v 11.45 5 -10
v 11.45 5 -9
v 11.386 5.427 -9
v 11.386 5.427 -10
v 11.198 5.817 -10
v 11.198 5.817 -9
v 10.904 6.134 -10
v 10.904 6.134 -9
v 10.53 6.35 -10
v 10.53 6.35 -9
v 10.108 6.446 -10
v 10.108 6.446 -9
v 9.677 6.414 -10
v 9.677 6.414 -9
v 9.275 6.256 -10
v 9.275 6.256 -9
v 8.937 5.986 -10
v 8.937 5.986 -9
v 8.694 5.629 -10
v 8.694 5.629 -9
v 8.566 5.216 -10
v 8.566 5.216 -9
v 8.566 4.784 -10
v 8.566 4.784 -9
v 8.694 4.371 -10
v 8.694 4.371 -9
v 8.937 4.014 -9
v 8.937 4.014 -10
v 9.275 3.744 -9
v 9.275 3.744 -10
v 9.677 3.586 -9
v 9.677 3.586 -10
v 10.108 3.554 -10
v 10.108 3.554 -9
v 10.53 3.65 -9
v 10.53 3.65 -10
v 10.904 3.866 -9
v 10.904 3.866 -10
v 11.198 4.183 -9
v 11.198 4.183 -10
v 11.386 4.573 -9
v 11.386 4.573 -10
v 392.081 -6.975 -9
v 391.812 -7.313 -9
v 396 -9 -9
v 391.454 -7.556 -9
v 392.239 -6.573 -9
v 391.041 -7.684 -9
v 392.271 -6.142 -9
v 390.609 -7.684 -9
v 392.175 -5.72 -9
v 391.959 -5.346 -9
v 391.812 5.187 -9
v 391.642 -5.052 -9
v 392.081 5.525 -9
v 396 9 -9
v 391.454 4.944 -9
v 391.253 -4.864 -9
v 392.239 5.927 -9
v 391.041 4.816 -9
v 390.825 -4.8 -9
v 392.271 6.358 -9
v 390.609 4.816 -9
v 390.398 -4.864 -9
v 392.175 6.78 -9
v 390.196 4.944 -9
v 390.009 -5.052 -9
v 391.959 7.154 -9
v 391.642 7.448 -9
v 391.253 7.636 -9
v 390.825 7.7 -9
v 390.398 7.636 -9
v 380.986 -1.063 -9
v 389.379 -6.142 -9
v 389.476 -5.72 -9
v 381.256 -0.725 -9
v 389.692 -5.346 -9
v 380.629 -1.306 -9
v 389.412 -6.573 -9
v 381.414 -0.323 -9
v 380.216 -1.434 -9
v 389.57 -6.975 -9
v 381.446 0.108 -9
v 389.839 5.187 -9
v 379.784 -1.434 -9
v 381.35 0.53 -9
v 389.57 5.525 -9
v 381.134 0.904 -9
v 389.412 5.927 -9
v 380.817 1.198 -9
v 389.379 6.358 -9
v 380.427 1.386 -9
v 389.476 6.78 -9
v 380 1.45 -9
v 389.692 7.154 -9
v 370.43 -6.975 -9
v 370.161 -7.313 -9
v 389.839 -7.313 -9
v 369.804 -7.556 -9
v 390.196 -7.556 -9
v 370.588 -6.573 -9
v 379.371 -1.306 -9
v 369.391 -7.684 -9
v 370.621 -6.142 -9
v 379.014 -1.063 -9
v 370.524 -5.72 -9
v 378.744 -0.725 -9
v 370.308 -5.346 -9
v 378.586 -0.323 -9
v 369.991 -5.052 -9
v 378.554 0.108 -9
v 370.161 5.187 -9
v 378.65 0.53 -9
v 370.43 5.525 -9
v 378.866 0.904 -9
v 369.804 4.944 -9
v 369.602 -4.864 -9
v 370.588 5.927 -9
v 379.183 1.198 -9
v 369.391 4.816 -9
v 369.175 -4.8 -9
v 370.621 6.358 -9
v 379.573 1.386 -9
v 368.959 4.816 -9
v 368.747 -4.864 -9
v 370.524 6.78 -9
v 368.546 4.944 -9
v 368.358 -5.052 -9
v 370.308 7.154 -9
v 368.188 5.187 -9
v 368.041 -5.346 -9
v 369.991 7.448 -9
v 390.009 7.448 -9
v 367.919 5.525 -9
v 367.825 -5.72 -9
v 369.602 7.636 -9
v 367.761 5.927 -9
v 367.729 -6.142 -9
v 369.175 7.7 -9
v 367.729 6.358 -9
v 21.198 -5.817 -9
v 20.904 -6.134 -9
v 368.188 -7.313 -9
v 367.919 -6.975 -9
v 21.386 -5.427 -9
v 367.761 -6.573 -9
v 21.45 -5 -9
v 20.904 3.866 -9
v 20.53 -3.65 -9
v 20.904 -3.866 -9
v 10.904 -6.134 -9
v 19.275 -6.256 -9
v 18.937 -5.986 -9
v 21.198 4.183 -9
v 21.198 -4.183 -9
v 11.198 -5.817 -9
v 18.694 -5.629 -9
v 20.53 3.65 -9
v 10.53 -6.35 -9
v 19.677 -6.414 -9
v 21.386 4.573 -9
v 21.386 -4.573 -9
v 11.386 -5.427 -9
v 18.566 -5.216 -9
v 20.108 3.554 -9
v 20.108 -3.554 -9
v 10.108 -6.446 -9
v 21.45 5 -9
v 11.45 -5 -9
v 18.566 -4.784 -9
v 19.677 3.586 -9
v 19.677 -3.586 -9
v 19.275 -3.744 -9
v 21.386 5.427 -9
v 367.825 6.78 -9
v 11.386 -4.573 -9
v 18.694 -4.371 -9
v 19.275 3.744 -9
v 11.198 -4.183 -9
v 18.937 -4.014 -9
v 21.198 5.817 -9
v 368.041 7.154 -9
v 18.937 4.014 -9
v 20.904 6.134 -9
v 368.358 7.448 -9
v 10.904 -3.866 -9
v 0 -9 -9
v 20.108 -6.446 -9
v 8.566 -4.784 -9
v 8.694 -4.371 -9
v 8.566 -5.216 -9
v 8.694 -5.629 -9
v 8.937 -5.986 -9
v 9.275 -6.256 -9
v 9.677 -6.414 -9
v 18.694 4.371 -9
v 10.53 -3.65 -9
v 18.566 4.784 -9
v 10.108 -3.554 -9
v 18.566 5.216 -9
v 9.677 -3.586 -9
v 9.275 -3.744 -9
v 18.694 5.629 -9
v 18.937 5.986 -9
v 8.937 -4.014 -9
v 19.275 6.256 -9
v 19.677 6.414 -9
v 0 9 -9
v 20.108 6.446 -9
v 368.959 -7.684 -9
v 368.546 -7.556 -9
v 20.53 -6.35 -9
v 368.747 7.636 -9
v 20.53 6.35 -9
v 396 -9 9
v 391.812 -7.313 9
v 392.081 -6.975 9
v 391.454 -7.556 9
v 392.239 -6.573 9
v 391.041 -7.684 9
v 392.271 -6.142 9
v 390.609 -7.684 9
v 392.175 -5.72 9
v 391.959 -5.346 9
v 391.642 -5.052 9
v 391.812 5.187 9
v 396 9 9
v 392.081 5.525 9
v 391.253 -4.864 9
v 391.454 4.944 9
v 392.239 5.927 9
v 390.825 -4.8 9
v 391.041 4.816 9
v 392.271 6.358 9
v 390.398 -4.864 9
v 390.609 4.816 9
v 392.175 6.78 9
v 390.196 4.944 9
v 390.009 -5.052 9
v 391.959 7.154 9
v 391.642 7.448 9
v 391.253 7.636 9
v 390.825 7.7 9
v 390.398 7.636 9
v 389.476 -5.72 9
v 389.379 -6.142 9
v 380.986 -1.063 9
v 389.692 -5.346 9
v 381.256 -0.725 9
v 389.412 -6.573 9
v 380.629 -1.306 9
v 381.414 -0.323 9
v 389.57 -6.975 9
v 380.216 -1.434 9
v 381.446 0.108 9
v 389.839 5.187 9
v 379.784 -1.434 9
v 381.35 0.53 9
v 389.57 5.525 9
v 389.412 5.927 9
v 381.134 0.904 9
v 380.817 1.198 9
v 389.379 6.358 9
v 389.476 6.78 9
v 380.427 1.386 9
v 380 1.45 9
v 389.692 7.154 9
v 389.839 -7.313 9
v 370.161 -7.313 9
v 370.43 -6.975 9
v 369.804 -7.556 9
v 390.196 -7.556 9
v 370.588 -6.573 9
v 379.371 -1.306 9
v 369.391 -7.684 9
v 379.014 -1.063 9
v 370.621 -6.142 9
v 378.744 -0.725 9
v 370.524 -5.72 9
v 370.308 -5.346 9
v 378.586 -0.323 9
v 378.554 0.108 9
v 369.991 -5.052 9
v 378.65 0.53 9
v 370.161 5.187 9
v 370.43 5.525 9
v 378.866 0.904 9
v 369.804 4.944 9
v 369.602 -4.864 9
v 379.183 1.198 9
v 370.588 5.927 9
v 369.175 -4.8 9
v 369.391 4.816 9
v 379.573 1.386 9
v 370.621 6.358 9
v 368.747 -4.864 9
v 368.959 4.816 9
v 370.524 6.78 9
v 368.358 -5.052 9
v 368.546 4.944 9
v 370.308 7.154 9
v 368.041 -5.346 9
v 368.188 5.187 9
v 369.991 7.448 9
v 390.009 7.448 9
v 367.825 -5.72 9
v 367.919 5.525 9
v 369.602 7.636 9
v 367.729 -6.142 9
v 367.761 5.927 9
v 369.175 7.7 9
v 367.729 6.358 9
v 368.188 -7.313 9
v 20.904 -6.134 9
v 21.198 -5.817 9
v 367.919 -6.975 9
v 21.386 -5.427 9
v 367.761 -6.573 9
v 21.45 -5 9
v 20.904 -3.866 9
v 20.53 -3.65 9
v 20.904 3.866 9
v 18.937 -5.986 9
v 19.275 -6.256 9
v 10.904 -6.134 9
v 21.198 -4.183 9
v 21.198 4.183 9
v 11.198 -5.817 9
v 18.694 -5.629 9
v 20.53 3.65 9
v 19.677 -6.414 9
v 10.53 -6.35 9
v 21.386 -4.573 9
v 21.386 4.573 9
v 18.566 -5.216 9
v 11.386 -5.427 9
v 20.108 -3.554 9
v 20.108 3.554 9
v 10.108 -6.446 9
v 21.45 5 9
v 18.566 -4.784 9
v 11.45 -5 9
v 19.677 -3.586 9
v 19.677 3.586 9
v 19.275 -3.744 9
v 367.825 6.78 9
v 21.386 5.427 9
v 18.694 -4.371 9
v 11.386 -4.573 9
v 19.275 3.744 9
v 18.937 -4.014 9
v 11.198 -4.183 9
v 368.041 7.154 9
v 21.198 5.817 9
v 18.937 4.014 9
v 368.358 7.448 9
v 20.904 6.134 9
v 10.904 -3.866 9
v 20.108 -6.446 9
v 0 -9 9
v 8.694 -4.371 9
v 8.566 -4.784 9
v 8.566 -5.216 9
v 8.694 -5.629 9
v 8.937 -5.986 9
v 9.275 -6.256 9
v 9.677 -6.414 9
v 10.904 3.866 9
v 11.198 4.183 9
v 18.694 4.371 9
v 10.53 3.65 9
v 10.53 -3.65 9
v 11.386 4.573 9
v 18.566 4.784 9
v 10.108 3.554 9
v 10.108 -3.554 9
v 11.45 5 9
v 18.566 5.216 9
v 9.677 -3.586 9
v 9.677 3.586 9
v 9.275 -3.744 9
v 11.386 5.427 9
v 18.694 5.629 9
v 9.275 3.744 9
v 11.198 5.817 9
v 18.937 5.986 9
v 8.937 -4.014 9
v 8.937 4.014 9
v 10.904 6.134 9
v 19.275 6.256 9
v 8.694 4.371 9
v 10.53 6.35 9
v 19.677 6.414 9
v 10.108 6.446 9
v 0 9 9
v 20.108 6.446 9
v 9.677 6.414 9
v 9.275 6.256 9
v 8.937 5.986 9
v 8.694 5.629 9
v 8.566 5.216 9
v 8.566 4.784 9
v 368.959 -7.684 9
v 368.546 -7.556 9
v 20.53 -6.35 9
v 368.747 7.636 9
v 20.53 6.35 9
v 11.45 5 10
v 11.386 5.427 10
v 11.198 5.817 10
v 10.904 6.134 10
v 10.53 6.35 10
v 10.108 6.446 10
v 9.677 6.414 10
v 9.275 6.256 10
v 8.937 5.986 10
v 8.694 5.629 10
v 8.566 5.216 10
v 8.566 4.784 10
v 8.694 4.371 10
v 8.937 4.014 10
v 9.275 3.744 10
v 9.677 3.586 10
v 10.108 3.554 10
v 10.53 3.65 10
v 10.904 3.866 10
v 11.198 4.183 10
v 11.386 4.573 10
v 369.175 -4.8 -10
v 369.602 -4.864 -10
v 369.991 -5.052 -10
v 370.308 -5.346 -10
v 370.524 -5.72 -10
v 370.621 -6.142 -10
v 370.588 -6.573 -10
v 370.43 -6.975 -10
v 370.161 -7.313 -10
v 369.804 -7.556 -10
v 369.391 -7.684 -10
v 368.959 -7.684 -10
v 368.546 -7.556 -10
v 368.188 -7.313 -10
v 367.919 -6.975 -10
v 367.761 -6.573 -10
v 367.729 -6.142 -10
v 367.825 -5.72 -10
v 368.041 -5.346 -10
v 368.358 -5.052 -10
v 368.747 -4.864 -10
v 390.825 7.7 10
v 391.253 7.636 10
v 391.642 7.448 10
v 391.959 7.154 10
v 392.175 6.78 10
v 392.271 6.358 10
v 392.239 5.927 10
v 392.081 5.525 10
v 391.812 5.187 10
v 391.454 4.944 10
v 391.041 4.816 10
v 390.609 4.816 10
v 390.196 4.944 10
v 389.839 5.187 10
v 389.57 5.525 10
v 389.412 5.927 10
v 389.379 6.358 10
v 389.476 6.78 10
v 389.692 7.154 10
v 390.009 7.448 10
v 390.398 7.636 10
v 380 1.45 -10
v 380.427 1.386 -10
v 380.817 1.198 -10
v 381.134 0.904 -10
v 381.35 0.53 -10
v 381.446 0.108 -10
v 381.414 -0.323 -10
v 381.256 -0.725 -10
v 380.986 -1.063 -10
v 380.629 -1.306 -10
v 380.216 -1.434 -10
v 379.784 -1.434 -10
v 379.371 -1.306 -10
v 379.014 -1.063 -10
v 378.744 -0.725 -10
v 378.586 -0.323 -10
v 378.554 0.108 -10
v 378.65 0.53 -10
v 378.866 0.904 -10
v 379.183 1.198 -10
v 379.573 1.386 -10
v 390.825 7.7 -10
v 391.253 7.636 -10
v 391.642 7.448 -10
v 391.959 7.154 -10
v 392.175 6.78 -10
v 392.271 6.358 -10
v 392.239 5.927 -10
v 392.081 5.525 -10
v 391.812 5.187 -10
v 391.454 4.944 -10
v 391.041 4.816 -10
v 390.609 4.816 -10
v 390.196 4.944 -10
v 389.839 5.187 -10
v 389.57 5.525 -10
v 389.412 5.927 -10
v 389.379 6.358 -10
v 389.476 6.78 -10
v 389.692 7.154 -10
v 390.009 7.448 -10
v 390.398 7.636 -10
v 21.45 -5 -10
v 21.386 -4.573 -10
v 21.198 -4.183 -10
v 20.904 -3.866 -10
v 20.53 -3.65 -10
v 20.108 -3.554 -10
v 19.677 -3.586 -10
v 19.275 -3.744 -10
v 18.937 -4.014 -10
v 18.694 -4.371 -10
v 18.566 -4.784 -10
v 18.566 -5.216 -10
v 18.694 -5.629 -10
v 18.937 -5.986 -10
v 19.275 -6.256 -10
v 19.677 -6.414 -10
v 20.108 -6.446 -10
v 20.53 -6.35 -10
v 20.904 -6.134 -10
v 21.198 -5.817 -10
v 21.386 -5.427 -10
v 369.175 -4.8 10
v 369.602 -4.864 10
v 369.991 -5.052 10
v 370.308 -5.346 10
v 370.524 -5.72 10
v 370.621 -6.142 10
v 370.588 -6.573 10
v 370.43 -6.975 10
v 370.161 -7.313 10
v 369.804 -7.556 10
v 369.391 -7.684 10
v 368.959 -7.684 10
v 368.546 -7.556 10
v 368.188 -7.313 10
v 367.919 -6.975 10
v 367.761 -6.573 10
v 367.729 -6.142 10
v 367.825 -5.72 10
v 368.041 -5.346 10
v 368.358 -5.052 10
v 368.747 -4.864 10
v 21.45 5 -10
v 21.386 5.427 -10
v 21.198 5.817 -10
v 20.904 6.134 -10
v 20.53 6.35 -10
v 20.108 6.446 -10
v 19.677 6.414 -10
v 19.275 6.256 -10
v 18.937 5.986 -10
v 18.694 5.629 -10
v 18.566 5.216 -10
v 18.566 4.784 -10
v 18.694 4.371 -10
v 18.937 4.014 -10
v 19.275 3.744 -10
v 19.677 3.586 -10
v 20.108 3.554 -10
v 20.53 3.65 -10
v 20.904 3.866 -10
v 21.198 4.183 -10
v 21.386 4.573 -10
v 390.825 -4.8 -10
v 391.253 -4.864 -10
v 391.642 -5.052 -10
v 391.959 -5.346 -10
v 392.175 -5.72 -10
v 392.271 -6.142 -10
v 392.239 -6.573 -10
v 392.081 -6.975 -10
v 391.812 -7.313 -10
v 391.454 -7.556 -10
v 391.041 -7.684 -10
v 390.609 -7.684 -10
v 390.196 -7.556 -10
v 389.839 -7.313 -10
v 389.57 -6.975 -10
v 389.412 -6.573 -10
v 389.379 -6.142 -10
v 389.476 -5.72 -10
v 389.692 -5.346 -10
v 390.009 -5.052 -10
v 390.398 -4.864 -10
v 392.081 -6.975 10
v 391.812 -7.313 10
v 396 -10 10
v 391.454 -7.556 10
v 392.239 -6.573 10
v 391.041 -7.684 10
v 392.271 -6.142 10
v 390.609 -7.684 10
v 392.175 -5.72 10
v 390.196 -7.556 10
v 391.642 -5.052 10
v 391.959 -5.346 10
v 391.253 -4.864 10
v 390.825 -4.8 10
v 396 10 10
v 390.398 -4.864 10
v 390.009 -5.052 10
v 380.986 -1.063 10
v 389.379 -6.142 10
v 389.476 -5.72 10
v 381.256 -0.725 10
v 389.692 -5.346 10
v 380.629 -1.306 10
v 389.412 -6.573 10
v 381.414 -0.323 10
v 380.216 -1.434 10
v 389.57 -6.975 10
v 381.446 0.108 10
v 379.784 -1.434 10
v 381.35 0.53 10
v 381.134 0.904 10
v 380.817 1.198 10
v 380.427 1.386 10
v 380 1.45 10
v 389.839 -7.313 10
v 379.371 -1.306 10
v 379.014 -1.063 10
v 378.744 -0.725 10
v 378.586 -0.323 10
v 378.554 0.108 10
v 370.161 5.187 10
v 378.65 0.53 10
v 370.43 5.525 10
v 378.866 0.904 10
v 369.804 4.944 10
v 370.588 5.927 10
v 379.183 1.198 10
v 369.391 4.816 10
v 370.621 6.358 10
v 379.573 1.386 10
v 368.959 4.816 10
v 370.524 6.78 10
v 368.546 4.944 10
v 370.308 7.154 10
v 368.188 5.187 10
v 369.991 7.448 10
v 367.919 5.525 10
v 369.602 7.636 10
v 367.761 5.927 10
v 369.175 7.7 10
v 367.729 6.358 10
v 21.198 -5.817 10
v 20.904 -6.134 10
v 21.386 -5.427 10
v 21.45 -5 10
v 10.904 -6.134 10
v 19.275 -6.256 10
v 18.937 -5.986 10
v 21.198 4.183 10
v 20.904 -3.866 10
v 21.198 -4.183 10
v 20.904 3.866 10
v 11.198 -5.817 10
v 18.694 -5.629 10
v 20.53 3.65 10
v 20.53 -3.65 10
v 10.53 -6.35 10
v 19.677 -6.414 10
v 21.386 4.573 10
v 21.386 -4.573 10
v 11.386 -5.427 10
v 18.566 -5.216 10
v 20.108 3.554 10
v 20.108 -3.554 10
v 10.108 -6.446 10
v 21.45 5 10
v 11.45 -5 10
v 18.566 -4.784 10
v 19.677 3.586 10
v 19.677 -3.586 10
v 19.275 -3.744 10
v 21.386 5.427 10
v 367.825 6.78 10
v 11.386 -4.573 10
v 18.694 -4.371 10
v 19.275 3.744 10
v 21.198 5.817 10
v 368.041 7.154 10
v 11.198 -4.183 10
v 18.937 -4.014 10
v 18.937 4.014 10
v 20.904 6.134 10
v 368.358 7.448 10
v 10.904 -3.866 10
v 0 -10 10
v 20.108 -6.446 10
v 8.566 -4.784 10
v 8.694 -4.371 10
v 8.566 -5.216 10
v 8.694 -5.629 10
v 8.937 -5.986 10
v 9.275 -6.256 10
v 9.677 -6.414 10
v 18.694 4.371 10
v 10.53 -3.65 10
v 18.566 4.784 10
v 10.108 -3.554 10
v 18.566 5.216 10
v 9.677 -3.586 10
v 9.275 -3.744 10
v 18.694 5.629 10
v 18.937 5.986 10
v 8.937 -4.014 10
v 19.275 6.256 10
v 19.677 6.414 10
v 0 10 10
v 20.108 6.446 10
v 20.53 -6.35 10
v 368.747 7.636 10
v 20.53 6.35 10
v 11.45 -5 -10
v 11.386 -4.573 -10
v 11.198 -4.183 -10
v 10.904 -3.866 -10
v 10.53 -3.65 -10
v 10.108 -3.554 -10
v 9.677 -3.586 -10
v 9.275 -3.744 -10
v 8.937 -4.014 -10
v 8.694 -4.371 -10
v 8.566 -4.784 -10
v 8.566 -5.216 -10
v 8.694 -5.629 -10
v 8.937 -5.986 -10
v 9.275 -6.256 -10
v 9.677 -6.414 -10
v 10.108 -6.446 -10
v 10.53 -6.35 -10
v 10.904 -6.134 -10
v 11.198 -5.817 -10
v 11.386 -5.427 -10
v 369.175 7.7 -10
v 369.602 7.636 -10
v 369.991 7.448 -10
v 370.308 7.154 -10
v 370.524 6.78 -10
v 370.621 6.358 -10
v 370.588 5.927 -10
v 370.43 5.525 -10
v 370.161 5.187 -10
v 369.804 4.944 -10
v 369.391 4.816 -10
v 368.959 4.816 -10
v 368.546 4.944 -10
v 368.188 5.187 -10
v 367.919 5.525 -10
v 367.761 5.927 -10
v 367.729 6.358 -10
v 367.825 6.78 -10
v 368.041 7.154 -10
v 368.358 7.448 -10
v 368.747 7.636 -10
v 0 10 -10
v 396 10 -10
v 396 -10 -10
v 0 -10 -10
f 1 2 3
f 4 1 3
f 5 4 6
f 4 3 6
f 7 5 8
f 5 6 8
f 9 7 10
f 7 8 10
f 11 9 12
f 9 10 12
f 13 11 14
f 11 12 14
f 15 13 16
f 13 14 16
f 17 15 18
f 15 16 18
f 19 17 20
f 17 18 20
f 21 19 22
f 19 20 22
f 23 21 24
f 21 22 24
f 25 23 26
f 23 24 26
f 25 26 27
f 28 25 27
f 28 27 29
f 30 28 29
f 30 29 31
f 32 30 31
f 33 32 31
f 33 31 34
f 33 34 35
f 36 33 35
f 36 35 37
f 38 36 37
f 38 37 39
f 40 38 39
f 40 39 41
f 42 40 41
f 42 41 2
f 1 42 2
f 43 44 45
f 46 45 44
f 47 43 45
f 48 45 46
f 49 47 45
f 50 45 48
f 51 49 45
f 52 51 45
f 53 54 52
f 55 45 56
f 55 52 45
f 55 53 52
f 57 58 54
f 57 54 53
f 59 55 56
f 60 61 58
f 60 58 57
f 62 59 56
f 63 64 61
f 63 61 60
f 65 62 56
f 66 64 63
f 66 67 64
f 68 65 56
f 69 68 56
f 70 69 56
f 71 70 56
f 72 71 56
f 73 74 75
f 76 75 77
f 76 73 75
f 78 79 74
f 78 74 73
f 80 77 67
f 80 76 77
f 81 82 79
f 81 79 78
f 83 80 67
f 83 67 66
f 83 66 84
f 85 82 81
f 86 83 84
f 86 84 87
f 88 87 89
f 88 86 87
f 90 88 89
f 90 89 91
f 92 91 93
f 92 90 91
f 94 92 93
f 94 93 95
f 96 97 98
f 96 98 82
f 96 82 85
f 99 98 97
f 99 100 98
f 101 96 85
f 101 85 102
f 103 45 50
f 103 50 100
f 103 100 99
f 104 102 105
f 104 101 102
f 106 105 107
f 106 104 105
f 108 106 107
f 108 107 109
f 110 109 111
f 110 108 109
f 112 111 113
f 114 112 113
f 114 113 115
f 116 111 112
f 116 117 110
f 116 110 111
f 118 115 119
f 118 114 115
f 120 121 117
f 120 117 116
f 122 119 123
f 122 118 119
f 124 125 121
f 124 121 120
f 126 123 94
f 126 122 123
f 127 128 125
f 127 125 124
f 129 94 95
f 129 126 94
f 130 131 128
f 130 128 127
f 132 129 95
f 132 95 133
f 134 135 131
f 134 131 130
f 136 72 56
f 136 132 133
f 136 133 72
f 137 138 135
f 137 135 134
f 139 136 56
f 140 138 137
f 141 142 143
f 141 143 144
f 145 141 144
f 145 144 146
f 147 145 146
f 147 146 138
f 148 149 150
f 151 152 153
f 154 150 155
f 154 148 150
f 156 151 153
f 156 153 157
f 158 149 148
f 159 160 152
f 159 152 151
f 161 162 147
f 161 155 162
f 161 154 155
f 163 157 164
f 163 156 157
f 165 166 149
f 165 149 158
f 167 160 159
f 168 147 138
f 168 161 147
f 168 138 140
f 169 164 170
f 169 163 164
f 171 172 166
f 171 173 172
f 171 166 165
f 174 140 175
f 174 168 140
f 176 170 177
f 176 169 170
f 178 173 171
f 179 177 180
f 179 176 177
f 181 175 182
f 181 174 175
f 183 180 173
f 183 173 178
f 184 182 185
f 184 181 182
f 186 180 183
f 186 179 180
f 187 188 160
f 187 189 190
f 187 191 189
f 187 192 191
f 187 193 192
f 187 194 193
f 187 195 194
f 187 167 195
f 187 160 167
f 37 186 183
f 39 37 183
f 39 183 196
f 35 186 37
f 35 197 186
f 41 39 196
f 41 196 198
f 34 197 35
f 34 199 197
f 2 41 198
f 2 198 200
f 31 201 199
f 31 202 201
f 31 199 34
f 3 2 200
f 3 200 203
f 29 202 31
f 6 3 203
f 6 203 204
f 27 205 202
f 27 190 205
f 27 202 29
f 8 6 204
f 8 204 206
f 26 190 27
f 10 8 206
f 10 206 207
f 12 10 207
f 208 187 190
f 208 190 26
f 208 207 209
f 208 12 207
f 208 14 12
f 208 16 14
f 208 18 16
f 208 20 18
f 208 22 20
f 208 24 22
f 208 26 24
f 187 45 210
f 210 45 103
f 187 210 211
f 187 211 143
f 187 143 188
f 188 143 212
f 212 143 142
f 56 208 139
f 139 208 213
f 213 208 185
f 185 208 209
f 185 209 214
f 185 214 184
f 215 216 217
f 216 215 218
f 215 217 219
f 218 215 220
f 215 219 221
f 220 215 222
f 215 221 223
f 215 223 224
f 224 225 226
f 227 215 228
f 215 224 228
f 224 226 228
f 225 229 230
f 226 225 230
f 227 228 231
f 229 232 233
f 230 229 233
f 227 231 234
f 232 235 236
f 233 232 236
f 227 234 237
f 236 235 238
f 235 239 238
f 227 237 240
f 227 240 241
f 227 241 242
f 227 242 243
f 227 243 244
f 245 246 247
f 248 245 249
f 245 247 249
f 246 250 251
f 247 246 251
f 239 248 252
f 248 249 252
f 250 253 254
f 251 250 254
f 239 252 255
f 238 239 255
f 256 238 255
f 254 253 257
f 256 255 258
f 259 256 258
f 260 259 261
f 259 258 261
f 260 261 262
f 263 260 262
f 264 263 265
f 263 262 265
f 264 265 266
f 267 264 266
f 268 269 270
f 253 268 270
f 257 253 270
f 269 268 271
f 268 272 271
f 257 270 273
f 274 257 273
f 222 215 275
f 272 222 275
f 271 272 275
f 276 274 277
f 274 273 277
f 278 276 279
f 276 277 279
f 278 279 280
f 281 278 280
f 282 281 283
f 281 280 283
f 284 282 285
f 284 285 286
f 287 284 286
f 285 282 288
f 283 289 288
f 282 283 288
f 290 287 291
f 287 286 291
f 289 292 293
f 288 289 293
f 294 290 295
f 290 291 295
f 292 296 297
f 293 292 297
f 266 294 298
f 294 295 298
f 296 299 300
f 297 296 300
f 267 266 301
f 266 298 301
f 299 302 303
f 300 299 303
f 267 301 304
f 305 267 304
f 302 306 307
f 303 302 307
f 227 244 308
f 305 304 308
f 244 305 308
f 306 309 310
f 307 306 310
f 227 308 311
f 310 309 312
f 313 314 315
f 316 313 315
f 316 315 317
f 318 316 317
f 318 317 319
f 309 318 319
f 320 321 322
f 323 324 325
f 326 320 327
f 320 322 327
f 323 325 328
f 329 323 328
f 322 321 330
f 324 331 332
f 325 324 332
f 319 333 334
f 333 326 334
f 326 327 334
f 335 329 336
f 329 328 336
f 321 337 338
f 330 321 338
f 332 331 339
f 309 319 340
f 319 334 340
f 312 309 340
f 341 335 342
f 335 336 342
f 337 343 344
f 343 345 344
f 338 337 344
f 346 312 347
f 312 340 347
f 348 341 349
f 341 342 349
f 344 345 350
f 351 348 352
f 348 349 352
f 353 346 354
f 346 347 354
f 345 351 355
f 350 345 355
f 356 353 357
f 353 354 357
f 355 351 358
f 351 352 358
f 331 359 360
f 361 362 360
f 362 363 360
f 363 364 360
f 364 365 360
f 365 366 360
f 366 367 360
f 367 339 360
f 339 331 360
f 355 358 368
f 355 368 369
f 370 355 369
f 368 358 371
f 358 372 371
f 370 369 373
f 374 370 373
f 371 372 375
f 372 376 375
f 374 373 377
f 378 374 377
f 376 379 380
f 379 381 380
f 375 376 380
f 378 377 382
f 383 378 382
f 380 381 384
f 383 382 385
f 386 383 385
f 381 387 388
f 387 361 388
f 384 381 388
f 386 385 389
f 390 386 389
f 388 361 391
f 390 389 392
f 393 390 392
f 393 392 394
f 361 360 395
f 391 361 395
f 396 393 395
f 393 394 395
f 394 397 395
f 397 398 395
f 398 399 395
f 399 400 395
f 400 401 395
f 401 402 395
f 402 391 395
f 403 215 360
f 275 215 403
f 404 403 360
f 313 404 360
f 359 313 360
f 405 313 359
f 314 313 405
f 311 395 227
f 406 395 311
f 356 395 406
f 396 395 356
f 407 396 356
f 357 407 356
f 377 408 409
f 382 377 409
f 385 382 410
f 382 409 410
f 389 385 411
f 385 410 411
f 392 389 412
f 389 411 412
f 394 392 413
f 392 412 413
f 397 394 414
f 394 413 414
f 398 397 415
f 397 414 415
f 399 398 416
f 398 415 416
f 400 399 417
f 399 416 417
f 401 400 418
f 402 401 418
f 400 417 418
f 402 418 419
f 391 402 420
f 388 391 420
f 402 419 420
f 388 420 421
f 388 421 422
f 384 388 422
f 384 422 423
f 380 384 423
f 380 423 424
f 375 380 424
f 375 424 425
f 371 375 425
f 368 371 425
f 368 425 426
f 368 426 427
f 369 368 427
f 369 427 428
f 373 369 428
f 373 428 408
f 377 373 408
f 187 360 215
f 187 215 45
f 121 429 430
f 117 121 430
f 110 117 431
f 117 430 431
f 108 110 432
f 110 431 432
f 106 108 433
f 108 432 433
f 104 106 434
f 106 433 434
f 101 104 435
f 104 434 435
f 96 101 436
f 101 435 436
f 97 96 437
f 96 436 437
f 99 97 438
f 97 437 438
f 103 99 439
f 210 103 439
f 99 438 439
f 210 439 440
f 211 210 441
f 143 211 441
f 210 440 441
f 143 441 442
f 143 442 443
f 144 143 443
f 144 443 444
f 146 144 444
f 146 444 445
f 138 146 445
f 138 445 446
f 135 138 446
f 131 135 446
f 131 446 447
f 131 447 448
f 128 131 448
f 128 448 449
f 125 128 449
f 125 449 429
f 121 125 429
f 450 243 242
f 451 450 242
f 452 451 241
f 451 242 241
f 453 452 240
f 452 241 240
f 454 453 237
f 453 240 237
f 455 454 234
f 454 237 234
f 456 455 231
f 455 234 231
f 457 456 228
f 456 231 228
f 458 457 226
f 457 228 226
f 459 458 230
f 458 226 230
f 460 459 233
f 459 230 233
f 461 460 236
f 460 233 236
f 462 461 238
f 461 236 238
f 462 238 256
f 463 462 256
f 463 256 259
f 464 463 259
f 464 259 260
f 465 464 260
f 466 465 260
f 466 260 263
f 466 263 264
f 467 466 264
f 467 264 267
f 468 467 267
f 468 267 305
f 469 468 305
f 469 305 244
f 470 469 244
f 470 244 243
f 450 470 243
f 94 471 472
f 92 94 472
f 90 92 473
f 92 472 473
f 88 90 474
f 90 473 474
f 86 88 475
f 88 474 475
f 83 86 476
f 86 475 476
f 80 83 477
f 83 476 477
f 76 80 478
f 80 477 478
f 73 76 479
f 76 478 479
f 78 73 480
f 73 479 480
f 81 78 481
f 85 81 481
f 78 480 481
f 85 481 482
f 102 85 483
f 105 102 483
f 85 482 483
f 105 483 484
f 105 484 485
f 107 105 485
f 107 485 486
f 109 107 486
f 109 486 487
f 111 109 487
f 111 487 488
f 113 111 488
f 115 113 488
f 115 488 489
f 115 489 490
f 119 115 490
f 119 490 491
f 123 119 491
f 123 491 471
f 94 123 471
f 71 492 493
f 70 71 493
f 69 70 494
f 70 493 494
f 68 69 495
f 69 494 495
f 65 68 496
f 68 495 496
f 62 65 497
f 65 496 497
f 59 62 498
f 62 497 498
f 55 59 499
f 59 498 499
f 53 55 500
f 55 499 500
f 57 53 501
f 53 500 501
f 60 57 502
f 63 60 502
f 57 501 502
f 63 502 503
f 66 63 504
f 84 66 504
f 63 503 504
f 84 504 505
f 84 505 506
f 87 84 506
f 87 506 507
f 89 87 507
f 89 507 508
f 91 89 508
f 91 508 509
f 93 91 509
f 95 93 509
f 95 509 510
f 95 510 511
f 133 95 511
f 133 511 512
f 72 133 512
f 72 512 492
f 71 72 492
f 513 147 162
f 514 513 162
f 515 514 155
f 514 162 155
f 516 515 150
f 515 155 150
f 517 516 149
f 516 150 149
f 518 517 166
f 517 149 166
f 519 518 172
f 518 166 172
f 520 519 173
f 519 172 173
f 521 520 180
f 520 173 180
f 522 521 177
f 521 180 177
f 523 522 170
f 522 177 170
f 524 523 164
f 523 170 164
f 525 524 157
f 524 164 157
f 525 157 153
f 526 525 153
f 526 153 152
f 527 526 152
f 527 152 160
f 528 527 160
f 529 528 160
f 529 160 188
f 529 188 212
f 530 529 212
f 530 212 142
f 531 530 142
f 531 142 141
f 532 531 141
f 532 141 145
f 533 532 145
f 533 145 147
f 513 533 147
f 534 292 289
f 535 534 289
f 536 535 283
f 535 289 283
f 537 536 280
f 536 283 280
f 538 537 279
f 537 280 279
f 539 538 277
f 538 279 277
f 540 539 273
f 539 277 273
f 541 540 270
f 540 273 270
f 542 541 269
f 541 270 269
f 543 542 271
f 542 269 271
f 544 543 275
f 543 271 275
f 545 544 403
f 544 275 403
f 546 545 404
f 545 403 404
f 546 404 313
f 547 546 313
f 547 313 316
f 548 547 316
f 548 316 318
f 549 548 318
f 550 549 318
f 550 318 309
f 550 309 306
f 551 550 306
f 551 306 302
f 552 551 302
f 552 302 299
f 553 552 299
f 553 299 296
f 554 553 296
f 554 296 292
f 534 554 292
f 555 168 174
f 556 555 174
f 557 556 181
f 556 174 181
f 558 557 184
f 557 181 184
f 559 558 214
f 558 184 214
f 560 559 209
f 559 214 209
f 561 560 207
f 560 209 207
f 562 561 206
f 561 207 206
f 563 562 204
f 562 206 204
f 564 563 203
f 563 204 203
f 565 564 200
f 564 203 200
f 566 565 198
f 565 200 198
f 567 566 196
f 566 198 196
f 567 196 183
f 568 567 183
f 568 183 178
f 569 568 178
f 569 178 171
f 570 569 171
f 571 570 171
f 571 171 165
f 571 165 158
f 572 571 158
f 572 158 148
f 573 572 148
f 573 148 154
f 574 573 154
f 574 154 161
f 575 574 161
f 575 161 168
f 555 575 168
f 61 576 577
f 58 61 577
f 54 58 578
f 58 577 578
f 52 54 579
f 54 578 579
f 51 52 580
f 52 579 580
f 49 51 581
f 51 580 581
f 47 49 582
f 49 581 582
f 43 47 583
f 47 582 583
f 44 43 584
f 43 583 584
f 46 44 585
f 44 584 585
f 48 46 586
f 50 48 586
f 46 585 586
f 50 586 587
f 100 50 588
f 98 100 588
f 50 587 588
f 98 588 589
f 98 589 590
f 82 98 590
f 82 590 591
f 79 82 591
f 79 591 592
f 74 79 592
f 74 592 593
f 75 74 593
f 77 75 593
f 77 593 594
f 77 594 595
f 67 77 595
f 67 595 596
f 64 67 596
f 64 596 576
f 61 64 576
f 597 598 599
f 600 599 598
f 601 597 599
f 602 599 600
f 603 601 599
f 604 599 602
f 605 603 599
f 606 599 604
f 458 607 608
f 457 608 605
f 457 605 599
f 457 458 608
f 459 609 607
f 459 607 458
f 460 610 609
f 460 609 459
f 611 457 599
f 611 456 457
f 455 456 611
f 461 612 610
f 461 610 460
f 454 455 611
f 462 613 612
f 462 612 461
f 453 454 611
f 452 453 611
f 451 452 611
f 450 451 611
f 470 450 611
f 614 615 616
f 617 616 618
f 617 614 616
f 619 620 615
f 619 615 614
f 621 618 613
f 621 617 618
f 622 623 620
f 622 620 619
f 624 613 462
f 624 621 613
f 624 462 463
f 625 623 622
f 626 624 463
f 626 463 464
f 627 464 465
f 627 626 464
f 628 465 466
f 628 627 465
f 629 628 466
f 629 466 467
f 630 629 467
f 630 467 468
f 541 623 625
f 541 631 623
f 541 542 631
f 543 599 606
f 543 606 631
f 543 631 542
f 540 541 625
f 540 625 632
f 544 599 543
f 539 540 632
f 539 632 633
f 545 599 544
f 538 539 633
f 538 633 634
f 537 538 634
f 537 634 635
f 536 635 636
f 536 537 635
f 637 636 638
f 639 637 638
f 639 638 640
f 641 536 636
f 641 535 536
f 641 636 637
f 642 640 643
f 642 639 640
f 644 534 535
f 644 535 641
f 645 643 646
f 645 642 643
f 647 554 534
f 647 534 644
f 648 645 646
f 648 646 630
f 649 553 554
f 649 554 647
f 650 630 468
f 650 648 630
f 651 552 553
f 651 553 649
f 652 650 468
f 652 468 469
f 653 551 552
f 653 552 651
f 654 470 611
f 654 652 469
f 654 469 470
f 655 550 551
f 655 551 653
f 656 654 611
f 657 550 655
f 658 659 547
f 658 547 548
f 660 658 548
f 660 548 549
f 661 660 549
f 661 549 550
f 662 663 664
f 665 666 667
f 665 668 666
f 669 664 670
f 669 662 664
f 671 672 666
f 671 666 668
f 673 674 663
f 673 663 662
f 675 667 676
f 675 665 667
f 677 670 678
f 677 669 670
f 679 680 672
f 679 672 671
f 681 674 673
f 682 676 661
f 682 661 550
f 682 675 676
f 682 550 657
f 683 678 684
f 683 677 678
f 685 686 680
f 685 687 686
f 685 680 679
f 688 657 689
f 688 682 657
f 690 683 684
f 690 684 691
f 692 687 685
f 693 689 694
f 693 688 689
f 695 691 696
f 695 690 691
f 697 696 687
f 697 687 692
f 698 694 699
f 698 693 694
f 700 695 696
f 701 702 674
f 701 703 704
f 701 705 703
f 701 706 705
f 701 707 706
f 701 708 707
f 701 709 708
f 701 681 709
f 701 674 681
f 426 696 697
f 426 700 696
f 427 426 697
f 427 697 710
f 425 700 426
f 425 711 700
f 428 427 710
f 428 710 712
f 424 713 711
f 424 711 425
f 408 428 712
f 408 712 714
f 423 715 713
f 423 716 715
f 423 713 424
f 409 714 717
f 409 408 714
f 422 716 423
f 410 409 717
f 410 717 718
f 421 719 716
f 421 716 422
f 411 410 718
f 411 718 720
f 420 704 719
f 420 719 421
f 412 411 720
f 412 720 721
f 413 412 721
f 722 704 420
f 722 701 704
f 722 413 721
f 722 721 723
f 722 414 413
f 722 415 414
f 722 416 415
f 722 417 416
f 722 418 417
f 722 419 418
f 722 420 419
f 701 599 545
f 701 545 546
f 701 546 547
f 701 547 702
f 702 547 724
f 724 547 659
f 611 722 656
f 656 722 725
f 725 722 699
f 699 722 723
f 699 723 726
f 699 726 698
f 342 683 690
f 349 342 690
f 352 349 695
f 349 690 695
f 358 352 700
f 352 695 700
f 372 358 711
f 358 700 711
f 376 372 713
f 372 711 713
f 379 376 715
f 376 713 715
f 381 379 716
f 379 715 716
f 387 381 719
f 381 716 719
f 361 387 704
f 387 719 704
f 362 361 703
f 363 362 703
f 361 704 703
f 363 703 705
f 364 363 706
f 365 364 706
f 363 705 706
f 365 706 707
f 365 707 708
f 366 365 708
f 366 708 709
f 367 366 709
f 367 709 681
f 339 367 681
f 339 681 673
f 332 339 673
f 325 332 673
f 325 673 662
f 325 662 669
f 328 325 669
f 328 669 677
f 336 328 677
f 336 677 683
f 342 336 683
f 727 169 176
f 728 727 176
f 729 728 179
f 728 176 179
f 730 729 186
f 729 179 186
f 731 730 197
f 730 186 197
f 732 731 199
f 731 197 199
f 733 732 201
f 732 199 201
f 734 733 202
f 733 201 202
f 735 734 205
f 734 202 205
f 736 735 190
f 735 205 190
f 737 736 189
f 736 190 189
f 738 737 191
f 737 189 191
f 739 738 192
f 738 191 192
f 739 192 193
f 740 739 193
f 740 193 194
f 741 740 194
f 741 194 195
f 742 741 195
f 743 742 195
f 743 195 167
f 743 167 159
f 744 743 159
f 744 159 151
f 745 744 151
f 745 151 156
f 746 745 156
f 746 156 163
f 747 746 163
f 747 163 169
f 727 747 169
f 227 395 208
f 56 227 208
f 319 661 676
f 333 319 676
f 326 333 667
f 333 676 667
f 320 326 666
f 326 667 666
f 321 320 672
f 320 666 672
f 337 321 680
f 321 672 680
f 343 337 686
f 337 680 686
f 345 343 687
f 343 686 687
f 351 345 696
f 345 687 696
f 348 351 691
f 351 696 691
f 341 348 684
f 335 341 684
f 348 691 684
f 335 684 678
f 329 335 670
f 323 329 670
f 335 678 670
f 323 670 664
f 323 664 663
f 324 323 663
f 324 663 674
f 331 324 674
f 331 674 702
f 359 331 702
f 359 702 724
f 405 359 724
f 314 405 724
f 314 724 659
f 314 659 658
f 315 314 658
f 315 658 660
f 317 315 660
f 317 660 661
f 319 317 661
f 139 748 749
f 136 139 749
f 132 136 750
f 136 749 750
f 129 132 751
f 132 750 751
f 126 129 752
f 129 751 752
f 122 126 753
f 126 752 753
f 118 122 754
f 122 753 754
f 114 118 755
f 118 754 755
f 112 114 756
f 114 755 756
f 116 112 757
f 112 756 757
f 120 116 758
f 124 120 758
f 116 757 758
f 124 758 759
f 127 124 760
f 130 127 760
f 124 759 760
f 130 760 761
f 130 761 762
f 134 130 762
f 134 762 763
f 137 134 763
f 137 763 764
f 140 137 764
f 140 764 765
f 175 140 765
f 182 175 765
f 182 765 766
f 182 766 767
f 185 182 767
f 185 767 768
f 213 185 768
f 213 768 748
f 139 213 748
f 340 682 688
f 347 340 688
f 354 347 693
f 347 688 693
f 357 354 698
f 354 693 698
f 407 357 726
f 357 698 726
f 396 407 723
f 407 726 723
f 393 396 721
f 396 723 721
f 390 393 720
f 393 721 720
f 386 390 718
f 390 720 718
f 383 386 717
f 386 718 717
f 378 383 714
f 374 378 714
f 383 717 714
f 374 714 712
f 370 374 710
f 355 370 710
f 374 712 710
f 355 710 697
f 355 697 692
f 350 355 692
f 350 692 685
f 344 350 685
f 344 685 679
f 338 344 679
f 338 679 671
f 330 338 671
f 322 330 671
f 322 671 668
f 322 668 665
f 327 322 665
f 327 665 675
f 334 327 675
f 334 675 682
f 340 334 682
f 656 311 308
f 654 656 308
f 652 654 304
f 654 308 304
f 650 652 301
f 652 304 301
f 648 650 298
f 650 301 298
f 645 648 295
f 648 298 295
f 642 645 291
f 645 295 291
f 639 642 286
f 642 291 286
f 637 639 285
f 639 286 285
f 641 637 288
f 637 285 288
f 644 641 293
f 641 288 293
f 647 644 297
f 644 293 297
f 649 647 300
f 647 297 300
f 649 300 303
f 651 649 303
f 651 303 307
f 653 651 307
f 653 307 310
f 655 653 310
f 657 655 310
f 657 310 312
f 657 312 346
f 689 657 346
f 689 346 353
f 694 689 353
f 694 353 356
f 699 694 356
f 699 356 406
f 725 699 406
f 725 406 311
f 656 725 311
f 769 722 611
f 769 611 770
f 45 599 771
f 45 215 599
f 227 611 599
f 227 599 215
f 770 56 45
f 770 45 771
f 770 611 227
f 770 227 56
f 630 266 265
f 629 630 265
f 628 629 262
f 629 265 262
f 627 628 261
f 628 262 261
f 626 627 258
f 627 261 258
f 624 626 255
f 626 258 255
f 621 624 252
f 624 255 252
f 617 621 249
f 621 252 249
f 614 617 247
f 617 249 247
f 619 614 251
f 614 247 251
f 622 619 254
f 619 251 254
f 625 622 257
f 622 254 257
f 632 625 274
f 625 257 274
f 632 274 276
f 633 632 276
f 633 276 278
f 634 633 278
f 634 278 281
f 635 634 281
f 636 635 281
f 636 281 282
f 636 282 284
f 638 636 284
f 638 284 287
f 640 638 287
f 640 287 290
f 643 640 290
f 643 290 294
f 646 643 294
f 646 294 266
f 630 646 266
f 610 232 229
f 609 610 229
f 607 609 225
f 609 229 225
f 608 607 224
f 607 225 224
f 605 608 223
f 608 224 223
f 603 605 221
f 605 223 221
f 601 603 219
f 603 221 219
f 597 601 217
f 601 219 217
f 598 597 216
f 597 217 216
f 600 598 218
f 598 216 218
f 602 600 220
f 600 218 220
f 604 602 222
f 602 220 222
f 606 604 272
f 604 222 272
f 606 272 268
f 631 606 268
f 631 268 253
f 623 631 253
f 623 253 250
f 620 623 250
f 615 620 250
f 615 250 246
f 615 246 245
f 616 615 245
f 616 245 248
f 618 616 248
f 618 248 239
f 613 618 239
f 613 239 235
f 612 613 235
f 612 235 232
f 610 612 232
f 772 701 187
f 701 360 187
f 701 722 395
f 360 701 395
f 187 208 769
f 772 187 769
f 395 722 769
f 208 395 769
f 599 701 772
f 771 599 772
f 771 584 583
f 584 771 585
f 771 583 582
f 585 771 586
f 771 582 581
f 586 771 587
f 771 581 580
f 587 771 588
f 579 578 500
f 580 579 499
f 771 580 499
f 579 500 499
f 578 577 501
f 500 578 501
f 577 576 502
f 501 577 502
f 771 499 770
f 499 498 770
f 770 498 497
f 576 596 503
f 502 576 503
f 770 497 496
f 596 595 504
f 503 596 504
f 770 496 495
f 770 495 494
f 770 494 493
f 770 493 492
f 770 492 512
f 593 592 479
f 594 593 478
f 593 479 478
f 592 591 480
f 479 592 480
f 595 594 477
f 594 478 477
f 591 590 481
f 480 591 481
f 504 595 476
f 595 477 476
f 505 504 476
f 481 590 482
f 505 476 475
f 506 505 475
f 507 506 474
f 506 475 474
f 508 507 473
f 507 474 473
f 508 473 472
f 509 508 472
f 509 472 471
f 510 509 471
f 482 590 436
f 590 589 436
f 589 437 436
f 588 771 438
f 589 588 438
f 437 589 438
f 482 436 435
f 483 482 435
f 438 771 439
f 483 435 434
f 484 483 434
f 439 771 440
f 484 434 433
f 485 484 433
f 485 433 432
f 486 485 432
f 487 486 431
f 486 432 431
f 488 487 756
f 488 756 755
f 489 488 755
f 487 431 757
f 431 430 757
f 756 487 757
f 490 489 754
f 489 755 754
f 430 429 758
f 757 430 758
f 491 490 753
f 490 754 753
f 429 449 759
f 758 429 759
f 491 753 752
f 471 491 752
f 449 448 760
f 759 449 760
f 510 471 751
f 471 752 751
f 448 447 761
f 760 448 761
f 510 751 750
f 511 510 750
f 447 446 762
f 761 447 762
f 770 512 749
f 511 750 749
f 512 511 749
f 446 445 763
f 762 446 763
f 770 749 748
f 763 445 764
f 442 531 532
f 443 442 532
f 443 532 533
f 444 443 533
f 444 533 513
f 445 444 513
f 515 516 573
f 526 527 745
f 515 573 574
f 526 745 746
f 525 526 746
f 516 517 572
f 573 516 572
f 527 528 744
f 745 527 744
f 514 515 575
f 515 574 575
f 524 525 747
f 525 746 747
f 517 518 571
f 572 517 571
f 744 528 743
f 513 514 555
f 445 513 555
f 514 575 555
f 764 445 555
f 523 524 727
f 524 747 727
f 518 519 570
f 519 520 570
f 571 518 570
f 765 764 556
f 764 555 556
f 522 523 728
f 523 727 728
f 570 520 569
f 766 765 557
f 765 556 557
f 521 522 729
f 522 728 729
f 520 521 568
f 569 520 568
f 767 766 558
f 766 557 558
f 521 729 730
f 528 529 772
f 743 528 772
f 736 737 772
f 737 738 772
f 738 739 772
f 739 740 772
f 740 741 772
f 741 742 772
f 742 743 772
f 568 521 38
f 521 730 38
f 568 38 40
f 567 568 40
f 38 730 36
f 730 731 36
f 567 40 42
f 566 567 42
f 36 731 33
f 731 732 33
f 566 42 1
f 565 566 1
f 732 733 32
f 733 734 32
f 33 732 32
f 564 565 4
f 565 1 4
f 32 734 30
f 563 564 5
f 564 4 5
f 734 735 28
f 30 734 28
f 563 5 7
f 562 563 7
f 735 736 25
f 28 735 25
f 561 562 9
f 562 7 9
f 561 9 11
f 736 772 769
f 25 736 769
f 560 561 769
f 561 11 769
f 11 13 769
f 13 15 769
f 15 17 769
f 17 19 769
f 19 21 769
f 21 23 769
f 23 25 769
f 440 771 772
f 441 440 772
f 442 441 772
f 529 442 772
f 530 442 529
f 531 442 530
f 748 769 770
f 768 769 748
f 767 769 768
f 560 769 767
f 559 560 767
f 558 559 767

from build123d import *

# Parameters (mm, degrees)
SKETCH_1_W          = 20
SKETCH_1_H          = 20
SKETCH_1_W_2        = 18
SKETCH_1_H_2        = 18
EXTRUDE_1_DEPTH     = 396
SKETCH_2_R          = 1.45
CUT_EXTRUDE_1_DEPTH = 397.630810704
SKETCH_3_R          = 1.45
CUT_EXTRUDE_2_DEPTH = 397.630810704


with BuildPart() as part:
    # 草图1 → 凸台-拉伸1 (new body)
    with BuildSketch(Plane(origin=(0, 0, 0), x_dir=(0, 0, -1), z_dir=(1, 0, 0))):
        Rectangle(SKETCH_1_W, SKETCH_1_H)
        Rectangle(SKETCH_1_W_2, SKETCH_1_H_2, mode=Mode.SUBTRACT)
    extrude(amount=EXTRUDE_1_DEPTH)

    # 草图2 → 切除-拉伸1 (cut, through all)
    with BuildSketch(Plane(origin=(0, 0, -10), x_dir=(-1, 0, 0), z_dir=(0, 0, -1))):
        with Locations((-380, -12.5)):
            Circle(SKETCH_2_R)
        with Locations(Location((-390.825317547, -6.25, 0), (0, 0, 90))):
            Circle(SKETCH_2_R)
        with Locations(Location((-390.825317547, 6.25, 0), (0, 0, 90))):
            Circle(SKETCH_2_R)
        with Locations((-380, 12.5)):
            Circle(SKETCH_2_R)
        with Locations(Location((-369.174682453, 6.25, 0), (0, 0, 90))):
            Circle(SKETCH_2_R)
        with Locations(Location((-369.174682453, -6.25, 0), (0, 0, 90))):
            Circle(SKETCH_2_R)
        with Locations(Location((-380, 0, 0), (0, 0, 90))):
            Circle(SKETCH_2_R)
    extrude(amount=-CUT_EXTRUDE_1_DEPTH, mode=Mode.SUBTRACT)

    # 草图3 → 切除-拉伸2 (cut, through all)
    with BuildSketch(Plane.XY.offset(10)):
        with Locations((10, 5)):
            Circle(SKETCH_3_R)
        with Locations((20, 5)):
            Circle(SKETCH_3_R)
        with Locations((10, -5)):
            Circle(SKETCH_3_R)
        with Locations((20, -5)):
            Circle(SKETCH_3_R)
        with Locations(Location((369.174682453, 6.25, 0), (0, 0, 90))):
            Circle(SKETCH_3_R)
        with Locations(Location((380, 0, 0), (0, 0, 90))):
            Circle(SKETCH_3_R)
        with Locations(Location((369.174682453, -6.25, 0), (0, 0, 90))):
            Circle(SKETCH_3_R)
        with Locations(Location((390.825317547, -6.25, 0), (0, 0, 90))):
            Circle(SKETCH_3_R)
        with Locations(Location((390.825317547, 6.25, 0), (0, 0, 90))):
            Circle(SKETCH_3_R)
    extrude(amount=-CUT_EXTRUDE_2_DEPTH, mode=Mode.SUBTRACT)


solid = part.part
